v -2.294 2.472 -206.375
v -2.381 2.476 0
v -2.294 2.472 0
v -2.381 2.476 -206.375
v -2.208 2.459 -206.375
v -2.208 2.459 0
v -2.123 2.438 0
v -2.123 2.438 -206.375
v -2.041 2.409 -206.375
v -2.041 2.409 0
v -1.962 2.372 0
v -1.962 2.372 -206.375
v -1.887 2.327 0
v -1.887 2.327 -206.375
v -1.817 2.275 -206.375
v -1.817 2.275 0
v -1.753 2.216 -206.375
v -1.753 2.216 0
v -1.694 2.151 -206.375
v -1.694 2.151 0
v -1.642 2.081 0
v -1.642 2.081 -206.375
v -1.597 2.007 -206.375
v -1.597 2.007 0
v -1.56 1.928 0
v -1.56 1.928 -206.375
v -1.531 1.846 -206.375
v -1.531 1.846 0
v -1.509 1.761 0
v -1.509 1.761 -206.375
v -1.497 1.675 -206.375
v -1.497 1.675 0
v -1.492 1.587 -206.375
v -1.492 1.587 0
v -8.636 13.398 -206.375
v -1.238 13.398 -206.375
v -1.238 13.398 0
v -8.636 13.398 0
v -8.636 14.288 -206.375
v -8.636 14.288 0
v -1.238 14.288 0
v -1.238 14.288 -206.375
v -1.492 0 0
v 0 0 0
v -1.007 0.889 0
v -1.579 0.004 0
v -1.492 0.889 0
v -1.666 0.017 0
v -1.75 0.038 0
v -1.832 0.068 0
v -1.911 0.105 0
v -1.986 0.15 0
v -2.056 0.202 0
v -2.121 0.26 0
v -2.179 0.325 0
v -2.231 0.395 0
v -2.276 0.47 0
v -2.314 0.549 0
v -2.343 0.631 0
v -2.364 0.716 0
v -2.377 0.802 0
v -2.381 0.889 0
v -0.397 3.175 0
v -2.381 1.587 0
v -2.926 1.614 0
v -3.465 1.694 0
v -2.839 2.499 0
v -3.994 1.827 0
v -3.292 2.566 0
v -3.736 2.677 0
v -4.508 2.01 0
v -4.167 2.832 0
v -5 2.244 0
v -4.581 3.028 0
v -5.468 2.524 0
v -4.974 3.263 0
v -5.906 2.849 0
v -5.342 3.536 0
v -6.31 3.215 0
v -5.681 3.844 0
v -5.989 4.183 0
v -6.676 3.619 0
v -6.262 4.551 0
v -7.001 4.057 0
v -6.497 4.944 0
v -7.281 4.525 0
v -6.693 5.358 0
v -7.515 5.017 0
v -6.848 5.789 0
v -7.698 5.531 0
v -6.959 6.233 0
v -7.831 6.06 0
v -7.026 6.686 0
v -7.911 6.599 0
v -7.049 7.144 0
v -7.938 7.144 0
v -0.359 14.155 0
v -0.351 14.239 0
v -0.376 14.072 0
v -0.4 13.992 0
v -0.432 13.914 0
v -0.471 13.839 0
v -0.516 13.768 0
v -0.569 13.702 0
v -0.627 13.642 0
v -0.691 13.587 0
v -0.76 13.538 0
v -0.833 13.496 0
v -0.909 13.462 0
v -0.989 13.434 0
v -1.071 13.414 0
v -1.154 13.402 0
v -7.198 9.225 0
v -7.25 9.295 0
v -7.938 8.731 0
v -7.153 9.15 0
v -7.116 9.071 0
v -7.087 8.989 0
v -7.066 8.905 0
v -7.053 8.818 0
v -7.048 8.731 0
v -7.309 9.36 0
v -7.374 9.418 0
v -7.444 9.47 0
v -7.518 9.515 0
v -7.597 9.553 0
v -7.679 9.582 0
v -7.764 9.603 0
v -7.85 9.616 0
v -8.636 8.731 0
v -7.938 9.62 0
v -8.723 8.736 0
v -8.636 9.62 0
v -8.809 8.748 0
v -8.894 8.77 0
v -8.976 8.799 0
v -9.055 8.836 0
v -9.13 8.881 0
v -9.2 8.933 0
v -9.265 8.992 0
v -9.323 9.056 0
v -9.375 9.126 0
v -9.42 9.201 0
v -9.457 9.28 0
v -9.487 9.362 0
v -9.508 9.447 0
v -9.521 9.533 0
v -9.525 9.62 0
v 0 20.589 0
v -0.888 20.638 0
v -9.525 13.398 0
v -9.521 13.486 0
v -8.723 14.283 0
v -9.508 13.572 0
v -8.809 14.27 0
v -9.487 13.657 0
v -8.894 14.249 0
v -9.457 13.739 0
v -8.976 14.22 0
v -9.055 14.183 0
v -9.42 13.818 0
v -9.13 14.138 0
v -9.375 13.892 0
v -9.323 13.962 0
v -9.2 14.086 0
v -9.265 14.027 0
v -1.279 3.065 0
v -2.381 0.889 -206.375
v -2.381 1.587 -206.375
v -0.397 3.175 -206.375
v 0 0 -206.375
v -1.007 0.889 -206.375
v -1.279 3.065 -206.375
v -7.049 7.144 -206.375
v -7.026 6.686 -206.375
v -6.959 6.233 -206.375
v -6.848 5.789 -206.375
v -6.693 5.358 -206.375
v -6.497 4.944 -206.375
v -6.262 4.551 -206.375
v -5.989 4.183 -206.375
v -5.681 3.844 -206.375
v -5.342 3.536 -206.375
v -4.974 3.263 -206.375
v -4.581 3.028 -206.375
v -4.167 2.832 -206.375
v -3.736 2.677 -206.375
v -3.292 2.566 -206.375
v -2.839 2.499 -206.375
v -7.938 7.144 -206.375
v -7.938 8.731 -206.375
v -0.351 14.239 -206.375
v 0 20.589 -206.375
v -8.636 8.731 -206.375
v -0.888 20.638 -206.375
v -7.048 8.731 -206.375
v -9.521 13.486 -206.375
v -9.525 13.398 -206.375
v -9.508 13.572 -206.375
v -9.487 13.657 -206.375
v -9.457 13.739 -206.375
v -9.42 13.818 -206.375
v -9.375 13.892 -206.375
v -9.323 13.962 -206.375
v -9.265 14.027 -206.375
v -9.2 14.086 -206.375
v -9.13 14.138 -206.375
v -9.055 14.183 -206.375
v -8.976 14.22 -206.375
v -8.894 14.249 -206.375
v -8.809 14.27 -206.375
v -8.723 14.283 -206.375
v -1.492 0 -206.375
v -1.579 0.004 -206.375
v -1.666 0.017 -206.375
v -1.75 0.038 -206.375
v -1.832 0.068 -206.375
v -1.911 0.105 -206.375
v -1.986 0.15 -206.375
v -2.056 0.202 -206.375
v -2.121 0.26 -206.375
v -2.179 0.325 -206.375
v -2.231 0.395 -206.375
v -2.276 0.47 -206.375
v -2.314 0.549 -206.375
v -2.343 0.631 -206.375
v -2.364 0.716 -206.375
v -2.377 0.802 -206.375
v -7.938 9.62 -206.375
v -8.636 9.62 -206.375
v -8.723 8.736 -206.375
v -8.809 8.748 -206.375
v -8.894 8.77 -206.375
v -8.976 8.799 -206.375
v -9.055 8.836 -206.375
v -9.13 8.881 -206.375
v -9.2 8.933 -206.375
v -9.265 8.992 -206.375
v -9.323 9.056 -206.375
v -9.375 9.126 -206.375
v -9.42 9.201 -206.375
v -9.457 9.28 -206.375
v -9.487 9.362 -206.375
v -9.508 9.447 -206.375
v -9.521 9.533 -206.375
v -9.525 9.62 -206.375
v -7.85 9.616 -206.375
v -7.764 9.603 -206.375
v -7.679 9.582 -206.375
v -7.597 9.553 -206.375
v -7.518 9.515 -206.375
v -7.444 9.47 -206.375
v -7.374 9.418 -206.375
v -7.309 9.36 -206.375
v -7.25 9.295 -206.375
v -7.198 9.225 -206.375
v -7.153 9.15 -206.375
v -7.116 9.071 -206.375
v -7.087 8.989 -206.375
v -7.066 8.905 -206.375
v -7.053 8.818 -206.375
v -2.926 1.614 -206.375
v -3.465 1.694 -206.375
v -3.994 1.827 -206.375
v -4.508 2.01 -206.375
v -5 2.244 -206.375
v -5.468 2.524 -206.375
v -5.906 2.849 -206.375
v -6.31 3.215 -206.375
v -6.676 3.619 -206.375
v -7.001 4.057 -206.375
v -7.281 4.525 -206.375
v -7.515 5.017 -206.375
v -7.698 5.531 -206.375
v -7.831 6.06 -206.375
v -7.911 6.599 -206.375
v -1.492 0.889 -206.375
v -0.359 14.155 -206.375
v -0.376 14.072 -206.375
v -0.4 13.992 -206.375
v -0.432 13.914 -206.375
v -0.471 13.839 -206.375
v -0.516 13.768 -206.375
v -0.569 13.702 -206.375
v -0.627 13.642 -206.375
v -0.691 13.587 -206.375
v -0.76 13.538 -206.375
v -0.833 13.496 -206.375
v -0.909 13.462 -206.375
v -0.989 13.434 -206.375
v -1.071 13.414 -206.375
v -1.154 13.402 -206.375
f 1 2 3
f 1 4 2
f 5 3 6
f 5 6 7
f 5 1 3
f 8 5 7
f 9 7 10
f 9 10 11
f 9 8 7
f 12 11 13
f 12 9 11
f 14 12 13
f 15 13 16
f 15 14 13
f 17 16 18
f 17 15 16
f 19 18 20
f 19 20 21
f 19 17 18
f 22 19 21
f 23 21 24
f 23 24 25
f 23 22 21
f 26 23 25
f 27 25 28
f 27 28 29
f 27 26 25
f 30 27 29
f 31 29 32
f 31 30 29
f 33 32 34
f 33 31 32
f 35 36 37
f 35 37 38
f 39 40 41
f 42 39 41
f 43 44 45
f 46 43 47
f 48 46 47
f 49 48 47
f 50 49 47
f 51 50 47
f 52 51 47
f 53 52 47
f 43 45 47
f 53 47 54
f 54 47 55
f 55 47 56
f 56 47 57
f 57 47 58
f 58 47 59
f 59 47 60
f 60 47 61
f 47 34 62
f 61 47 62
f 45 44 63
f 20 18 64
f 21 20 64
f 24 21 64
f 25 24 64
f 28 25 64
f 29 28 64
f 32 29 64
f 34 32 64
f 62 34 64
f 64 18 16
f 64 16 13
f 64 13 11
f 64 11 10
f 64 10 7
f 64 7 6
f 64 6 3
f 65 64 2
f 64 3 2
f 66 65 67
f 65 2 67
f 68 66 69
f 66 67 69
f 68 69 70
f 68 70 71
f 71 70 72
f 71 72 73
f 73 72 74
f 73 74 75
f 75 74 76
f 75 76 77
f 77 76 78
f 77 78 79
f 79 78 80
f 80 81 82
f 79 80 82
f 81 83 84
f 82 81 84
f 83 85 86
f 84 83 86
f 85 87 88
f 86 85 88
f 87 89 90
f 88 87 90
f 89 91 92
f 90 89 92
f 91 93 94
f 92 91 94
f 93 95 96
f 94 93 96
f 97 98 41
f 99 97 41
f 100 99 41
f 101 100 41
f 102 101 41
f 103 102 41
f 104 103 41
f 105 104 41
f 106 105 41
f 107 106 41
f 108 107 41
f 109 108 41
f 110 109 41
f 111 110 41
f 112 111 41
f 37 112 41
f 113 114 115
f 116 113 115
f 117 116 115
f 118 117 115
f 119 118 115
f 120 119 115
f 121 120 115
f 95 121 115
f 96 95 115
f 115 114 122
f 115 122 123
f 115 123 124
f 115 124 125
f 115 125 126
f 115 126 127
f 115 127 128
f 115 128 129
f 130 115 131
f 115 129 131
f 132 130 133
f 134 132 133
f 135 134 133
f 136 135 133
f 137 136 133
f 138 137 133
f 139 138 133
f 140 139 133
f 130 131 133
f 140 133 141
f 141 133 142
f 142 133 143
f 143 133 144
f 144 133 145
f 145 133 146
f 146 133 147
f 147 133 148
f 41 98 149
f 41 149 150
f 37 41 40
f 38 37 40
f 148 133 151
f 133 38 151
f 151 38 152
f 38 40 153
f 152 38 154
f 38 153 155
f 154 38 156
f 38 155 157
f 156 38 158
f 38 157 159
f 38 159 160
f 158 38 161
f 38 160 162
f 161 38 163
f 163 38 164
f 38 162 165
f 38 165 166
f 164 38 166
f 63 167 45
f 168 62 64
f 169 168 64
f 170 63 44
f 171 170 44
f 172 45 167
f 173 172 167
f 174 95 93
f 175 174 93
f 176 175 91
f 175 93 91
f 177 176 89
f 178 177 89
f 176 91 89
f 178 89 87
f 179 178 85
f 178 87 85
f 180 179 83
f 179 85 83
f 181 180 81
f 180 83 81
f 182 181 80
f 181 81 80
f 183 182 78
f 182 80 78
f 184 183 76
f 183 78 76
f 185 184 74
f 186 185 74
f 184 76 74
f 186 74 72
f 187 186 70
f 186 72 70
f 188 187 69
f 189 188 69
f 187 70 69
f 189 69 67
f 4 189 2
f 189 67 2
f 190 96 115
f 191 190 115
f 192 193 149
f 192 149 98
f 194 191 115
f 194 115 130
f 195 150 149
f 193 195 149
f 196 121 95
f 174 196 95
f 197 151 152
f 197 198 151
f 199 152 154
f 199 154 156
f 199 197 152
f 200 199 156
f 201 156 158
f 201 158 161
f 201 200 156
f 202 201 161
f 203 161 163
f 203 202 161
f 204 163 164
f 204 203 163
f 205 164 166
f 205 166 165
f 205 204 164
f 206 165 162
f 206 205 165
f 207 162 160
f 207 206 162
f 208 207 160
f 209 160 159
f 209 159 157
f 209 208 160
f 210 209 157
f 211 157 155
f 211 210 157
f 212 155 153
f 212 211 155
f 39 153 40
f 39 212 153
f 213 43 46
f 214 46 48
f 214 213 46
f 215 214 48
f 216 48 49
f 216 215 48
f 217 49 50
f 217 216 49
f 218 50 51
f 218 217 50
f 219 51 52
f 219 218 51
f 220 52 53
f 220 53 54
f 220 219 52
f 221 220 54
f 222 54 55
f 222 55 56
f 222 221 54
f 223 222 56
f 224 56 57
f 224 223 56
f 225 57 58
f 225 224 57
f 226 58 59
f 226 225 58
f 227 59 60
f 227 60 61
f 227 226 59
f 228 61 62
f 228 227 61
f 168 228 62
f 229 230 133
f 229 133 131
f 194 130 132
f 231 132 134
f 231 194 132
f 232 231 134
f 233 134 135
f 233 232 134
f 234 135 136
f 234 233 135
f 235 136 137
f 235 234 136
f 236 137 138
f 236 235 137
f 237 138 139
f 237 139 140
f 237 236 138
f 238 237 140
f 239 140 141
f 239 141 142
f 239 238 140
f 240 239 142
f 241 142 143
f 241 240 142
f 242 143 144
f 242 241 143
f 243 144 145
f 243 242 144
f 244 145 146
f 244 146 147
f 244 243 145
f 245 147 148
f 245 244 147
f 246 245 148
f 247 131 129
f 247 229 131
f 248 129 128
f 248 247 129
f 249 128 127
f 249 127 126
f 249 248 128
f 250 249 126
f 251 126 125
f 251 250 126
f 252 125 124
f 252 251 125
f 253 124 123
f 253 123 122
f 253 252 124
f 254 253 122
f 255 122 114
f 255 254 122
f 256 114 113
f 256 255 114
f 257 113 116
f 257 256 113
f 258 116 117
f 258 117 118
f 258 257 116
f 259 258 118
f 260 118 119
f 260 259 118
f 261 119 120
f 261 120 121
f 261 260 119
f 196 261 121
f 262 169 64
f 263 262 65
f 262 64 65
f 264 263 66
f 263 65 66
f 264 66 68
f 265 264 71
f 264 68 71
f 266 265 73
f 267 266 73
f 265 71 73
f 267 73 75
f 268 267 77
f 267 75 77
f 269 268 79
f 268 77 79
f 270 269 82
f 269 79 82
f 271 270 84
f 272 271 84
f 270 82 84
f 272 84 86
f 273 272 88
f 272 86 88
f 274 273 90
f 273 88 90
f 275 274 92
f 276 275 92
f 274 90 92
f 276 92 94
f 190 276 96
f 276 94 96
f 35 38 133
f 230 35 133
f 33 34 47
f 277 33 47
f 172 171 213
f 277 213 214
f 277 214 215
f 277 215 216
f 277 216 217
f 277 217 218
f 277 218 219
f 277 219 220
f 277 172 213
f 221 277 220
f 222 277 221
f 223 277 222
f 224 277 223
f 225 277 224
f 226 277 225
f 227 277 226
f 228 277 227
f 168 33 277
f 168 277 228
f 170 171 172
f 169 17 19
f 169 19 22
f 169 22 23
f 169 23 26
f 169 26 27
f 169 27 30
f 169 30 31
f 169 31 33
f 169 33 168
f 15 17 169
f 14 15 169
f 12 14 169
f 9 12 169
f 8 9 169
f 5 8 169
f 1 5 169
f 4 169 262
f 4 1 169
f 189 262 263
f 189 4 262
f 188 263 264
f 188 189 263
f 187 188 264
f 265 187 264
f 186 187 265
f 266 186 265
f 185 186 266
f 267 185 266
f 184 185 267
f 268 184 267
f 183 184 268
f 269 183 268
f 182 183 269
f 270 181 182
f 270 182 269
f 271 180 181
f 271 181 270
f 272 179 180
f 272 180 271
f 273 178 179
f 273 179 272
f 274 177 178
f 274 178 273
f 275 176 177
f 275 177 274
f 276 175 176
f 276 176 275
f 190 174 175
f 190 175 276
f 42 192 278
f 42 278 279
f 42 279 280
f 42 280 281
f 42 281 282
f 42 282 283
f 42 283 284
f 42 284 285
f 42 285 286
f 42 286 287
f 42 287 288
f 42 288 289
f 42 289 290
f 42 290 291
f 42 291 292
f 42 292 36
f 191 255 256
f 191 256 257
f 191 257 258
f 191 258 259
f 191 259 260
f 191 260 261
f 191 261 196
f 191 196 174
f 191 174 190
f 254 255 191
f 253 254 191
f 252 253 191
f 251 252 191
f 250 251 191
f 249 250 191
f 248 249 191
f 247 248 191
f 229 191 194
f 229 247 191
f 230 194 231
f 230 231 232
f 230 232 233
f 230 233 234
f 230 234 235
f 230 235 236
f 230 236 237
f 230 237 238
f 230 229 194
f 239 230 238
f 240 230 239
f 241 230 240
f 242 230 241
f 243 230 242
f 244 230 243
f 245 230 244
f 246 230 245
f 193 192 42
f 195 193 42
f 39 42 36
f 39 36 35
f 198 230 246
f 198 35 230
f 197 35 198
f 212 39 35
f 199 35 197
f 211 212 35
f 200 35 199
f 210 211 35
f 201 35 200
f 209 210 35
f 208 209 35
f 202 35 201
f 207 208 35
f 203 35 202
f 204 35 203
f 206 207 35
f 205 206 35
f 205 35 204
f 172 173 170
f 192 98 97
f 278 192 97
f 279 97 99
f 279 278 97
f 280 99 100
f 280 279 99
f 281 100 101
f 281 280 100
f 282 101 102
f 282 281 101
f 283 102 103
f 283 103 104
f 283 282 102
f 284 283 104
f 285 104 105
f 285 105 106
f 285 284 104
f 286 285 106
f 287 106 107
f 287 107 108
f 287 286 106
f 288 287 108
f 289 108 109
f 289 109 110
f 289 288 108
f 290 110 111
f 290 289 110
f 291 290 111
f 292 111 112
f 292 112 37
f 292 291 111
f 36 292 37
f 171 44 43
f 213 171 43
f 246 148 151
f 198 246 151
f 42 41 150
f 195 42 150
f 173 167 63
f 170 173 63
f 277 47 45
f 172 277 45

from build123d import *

# Parameters (mm, degrees)
BOSS_EXTRUDE1_DEPTH = 206.375
FILLET1_R           = 0.889


with BuildPart() as part:
    # Sketch1 → Boss-Extrude1 (new body)
    with BuildSketch(Plane.XY):
        with BuildLine():
            Line((-0.396875, 3.175), (0, 0))
            Line((0, 0), (-2.38125, 0))
            Line((-2.38125, 0), (-2.38125, 1.5875))
            ThreePointArc((-2.38125, 1.5875), (-6.310112, 3.214888), (-7.9375, 7.14375))
            Line((-7.9375, 7.14375), (-7.9375, 8.73125))
            Line((-7.9375, 8.73125), (-9.525, 8.73125))
            Line((-9.525, 8.73125), (-9.525, 14.2875))
            Line((-9.525, 14.2875), (-1.238157, 14.2875))
            Line((-1.238157, 14.2875), (-0.887649, 20.6375))
            Line((-0.887649, 20.6375), (0, 20.588503))
            Line((0, 20.588503), (-0.396875, 13.3985))
            Line((-0.396875, 13.3985), (-8.636, 13.3985))
            Line((-8.636, 13.3985), (-8.636, 9.62025))
            Line((-8.636, 9.62025), (-7.0485, 9.62025))
            Line((-7.0485, 9.62025), (-7.0485, 7.14375))
            ThreePointArc((-7.0485, 7.14375), (-5.350597, 3.542888), (-1.49225, 2.561949))
            Line((-1.49225, 2.561949), (-1.49225, 0.889))
            Line((-1.49225, 0.889), (-1.007043, 0.889))
            Line((-1.007043, 0.889), (-1.27901, 3.064733))
            Line((-1.27901, 3.064733), (-0.396875, 3.175))
        make_face()
    extrude(amount=-BOSS_EXTRUDE1_DEPTH)

    # Fillet1
    fillet1_edges = [part.edges().sort_by_distance(p)[0] for p in [
        (-2.38125, 0, -103.1875),
        (-9.525, 8.73125, -103.1875),
        (-9.525, 14.2875, -103.1875),
        (-0.396875, 13.3985, -103.1875),
        (-7.0485, 9.62025, -103.1875),
        (-1.49225, 2.561949, -103.1875),
    ]]
    fillet(fillet1_edges, radius=FILLET1_R)


solid = part.part
